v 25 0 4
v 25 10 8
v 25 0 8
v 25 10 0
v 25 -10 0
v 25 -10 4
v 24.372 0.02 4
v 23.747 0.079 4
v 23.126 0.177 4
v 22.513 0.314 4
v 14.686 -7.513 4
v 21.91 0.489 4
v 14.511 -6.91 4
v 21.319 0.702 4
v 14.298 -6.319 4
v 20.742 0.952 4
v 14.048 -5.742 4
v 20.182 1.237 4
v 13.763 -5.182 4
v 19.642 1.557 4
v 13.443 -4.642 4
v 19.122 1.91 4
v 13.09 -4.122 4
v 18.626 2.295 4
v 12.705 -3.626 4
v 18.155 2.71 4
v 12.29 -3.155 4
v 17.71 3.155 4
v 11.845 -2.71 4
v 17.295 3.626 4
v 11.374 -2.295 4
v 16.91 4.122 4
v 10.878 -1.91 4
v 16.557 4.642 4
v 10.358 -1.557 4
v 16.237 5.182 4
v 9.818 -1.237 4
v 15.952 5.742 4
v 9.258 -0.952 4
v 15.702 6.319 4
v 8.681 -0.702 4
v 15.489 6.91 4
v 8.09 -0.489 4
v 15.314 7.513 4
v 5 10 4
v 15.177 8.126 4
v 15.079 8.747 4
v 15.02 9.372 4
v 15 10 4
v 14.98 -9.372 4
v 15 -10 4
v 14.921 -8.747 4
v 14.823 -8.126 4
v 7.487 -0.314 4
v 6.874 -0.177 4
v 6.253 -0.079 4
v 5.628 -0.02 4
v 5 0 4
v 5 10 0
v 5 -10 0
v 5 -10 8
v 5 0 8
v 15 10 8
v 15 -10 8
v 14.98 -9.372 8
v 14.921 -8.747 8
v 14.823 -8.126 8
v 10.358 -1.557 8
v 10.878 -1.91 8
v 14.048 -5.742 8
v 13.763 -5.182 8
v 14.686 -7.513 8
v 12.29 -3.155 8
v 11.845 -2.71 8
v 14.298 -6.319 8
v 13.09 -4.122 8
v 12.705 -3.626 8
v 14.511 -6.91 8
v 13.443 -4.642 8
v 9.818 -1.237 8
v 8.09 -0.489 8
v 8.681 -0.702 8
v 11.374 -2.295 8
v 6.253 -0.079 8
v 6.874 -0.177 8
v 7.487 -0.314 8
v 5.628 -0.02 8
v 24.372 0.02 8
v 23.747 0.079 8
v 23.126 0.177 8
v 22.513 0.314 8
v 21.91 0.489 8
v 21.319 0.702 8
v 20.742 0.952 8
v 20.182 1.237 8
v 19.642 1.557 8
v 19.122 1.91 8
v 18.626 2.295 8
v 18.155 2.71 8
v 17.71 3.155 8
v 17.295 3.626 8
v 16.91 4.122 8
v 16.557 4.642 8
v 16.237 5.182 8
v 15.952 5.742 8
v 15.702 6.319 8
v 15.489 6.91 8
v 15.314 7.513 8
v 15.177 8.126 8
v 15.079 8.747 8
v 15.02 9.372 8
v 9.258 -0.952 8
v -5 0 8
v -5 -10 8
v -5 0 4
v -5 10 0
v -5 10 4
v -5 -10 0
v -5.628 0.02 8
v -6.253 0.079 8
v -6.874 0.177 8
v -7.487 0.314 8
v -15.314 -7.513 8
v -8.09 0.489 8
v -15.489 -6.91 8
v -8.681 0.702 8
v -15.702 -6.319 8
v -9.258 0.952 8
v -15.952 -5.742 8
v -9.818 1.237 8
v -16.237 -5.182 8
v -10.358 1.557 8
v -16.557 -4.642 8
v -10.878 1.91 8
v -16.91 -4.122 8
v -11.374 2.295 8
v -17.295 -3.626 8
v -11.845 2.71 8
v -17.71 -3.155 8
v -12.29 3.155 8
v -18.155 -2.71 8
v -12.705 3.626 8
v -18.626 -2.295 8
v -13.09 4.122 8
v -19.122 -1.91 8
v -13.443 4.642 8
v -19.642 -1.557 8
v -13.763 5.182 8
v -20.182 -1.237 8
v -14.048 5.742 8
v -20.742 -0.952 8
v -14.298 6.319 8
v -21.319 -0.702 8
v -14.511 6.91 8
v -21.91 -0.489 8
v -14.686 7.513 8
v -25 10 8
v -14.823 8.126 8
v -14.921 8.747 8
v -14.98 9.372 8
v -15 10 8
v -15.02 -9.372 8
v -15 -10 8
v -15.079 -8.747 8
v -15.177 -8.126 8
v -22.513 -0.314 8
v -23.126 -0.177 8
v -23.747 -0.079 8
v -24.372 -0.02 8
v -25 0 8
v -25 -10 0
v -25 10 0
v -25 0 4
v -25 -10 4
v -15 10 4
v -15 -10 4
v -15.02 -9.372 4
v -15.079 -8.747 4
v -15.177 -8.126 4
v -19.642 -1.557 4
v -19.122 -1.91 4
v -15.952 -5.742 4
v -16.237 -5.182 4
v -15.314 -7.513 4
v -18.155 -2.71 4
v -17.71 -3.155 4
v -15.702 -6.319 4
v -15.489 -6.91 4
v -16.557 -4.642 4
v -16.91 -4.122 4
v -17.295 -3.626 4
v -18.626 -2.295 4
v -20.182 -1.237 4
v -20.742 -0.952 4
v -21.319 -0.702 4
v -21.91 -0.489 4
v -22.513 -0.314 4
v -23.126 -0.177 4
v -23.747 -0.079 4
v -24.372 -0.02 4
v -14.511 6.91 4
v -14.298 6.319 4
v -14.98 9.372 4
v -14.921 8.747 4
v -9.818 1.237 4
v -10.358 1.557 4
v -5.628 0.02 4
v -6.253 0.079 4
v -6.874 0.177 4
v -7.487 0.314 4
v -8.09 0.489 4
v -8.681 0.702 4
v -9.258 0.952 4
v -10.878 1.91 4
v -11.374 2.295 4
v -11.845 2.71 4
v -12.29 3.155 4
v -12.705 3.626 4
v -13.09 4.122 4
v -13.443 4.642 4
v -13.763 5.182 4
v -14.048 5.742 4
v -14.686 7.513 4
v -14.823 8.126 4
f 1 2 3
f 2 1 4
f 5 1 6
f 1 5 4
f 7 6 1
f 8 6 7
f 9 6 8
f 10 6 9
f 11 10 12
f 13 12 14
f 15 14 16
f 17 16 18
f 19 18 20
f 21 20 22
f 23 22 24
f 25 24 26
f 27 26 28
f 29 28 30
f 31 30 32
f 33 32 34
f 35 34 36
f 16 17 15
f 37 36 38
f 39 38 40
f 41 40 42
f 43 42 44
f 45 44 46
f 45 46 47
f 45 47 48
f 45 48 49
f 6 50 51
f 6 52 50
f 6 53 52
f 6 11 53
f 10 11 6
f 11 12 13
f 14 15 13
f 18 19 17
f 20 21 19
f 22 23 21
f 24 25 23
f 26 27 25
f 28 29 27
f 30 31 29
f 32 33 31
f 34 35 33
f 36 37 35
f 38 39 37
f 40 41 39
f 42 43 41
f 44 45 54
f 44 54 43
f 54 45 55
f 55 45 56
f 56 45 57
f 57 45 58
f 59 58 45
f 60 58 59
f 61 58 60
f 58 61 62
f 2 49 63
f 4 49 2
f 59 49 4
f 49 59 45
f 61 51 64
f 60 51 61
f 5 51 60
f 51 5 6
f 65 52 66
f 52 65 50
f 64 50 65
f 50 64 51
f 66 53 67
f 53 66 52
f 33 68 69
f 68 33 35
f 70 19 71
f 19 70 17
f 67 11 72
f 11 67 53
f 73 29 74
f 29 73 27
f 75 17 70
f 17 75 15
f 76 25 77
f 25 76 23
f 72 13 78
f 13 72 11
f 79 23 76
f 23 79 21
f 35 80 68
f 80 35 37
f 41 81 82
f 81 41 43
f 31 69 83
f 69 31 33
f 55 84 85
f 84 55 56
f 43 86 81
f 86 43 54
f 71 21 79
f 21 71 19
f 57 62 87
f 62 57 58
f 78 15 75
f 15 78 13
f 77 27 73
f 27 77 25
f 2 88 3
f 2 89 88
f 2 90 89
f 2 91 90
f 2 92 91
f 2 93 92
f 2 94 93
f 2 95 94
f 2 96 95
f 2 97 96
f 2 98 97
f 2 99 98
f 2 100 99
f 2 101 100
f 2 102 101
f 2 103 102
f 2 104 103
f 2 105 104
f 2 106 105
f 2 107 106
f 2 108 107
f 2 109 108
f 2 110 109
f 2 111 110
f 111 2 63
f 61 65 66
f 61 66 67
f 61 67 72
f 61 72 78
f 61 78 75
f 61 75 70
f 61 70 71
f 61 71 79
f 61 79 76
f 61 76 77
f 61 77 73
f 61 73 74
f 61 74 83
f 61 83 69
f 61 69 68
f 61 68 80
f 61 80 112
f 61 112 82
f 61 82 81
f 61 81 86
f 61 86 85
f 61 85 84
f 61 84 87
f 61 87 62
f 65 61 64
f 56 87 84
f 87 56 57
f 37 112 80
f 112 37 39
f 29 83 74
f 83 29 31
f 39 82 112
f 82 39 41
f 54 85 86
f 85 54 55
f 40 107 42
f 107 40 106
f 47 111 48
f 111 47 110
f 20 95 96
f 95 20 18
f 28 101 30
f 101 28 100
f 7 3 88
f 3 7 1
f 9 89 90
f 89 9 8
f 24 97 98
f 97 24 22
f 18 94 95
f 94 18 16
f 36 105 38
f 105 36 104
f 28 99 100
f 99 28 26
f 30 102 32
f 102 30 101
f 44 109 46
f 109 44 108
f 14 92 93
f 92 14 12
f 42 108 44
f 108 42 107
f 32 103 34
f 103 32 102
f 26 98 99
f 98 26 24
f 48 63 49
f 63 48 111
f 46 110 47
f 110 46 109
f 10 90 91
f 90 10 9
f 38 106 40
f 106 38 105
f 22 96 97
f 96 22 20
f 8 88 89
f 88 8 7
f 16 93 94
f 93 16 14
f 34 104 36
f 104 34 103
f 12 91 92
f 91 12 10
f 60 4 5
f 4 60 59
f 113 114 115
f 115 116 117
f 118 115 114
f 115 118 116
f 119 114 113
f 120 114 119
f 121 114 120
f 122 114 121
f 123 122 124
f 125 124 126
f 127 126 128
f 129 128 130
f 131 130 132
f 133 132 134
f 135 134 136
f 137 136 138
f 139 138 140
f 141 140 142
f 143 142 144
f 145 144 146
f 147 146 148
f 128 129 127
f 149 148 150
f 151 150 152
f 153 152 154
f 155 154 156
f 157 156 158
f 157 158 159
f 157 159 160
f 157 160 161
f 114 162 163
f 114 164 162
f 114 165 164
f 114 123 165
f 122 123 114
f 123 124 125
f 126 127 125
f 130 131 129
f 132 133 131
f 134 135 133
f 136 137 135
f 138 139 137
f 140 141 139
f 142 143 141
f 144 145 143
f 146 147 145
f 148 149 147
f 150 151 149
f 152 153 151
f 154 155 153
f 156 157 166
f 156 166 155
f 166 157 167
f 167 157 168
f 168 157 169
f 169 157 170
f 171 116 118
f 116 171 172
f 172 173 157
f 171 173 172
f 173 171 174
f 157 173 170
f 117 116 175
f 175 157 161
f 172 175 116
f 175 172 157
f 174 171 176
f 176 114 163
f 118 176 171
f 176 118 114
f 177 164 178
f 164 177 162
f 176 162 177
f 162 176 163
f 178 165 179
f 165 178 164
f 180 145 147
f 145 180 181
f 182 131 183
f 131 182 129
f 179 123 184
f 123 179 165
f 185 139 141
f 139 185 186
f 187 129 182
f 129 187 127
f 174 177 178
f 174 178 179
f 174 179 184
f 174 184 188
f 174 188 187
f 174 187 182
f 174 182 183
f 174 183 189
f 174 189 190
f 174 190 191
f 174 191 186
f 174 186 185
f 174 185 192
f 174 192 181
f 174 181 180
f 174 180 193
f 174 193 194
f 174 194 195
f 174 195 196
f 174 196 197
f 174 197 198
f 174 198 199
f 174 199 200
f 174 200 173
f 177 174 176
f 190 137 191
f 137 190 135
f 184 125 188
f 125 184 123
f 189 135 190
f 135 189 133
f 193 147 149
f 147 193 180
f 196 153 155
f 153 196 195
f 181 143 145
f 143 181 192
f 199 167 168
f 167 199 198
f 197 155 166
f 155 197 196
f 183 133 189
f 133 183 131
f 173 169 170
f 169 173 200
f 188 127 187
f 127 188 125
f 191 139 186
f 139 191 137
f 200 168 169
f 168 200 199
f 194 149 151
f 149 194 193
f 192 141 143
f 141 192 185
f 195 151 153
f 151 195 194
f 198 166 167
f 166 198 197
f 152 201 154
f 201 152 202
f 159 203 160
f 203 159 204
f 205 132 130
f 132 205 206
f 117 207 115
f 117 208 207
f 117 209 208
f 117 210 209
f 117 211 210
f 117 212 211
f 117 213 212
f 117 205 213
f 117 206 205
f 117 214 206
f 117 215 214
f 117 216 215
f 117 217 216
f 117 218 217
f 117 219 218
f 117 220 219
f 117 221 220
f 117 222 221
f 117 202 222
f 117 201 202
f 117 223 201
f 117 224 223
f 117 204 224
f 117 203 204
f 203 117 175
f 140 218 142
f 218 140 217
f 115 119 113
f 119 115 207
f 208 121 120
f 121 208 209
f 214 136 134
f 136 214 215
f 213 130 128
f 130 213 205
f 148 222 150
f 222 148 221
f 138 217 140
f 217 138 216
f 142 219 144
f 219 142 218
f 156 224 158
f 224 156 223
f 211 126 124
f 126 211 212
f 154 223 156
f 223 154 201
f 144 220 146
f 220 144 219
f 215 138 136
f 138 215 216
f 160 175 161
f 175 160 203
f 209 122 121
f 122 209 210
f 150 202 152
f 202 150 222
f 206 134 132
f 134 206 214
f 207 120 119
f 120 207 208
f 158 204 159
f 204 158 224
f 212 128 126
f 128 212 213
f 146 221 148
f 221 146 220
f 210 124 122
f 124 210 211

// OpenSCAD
// Truchet tiles. Print equal numbers of pos and neg tiles 
// and see what you can create.

// What do you want to print?
// Enable plate below to do a whole plate with both.
// Use pair to get a pair for testing.
want = "pair"; // neg | pos | pair

// size of the tile
size = 20;
// total height of the tile
height = 8;
// thickness of the base relative to the total height
ratio = .5;

// Hide either the 'top' or 'bottom' of the tile.
// Useful for dual extrusion.
// Set to "none" to have the whole tile
hide = "none"; // none | top | bottom

//
// Plate Options
//
plate = 0; // 1 = generate a plate, 0 = don't
plate_size = 80;
separation = 5;
count = (plate_size + separation) / (size + separation);


if( plate == 1 ) {
	for ( x = [ 0 : count] ) {
		for ( y = [0 : count ] ) {
			if( round((x+y)/2) == (x+y)/2  ) {
				translate( [ x * (size+separation), y * (size+separation), 0]) {
					positive_tile();
				}				
			}
			if( round((x+y)/2) != (x+y)/2 ) {
				translate( [ x * (size+separation), y * (size+separation), 0]) {
					negative_tile();
				}				
			}
		}
	}
}
else {
if( want == "pair" ) {
	translate([size/2 + 5, 0, 0]) {
		positive_tile();
	}

	translate([-(size/2 + 5), 0, 0]) {
		negative_tile();
	}
}
if( want == "pos" && !plate) {
	positive_tile();
}

if( want == "neg" && !plate) {
	negative_tile();
}
}


module negative_tile() {
	translate([0, 0, height/2]) {
		if( hide == "top" ) {
			translate([0, 0, -height*ratio/2]) {
				cube(size=[size, size, height*ratio], center=true);										
			}
		}

		if( hide == "bottom") {
			difference() {
				translate([0, 0, height*(1-ratio)/2]) {
					cube(size=[size, size, height*(1-ratio)], center=true);
				}
				translate([-(size/2), -(size/2), height*ratio]) {
					cylinder(r=(size/2), h=height+2, center=true, $fn=100);	
				}
				translate([(size/2), (size/2), height*ratio]) {
					cylinder(r=(size/2), h=height+2, center=true, $fn=100);	
				}	
			}
		}

		if( hide == "none") {
			intersection() {
				cube(size=[size, size, height], center=true);				
				difference() {
					cube(size=[size, size, height], center=true);
					translate([-(size/2), -(size/2), height*ratio]) {
						cylinder(r=(size/2), h=height, center=true, $fn=100);	
					}
					translate([(size/2), (size/2), height*ratio]) {
						cylinder(r=(size/2), h=height, center=true, $fn=100);	
					}	
				}
			}					
		}
	}
}

module positive_tile() {
	translate([0, 0, height/2]) {
		if( hide == "top" ) {
			translate([0, 0, -height*ratio/2]) {
				cube(size=[size, size, height*ratio], center=true);										
			}
		}

		if( hide == "bottom") {
			intersection() {
				translate([0, 0, height*(1-ratio)/2]) {
					cube(size=[size, size, height*(1-ratio)], center=true);
				}
				union() {
					translate([-(size/2), -(size/2), 0]) {
						cylinder(r=(size/2), h=height, center=true, $fn=100);	
					}
					translate([(size/2), (size/2), 0]) {
						cylinder(r=(size/2), h=height, center=true, $fn=100);	
					}	
				}
			}

		}


		if( hide == "none") {
			intersection() {
				cube(size=[size, size, height], center=true);
				union() {
					translate([0, 0, -height*(1-ratio)]) {
						cube(size=[size, size, height], center=true);				
					}
					translate([-(size/2), -(size/2), 0]) {
						cylinder(r=(size/2), h=height, center=true, $fn=100);	
					}
					translate([(size/2), (size/2), 0]) {
						cylinder(r=(size/2), h=height, center=true, $fn=100);	
					}	
				}
			}

		}
	}
}
